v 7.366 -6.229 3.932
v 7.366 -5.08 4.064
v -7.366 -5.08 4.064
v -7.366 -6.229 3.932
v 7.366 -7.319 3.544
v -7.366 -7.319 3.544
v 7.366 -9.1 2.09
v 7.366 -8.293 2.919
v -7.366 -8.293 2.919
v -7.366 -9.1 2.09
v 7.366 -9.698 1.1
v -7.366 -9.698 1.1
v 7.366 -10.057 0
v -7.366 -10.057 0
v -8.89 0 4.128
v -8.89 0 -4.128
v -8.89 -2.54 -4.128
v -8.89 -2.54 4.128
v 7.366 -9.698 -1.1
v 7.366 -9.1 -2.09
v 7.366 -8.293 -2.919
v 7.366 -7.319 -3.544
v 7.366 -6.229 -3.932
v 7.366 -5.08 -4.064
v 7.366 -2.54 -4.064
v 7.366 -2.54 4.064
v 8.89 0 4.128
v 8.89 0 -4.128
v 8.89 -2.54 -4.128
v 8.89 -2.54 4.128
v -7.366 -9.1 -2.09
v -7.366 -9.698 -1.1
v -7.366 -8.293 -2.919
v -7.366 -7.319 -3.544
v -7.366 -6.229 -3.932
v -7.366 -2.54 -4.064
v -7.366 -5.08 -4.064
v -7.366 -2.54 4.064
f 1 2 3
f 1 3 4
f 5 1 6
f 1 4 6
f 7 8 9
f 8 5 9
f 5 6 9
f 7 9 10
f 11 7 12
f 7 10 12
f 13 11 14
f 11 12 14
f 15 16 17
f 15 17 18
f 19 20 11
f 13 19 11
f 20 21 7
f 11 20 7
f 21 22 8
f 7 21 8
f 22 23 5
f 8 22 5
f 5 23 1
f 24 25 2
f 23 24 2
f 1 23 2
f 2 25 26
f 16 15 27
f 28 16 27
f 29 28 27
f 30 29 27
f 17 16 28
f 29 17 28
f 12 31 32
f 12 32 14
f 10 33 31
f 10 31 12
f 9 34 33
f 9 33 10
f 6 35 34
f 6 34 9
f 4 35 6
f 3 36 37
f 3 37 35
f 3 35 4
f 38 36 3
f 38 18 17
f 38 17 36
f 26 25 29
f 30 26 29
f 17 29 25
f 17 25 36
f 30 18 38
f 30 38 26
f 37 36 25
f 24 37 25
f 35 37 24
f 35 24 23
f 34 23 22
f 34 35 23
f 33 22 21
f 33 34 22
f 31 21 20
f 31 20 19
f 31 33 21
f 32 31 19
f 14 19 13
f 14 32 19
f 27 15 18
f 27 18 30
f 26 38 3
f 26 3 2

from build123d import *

# Parameters (mm, degrees)
F0_W        = 17.78
F0_H        = 8.255
F1_DEPTH    = 2.54
F2_W        = 14.732
F2_H        = 8.128
F3_DEPTH    = 10.16
F4_T1_DEPTH = 40.132


# Not quite as in the source:
# - a fillet or chamfer that OpenCascade refuses, or shapes differently, is made with other operations: its cross-section is extruded or revolved along the edge and cut away or added


with BuildPart() as f1:
    # F0 (on Front) → F1 (new body)
    with BuildSketch(Plane.XZ):
        Rectangle(F0_W, F0_H)
    extrude(amount=F1_DEPTH)

    # F2 (on Front) → F3 (join)
    with BuildSketch(Plane.XZ):
        Rectangle(F2_W, F2_H)
    extrude(amount=F3_DEPTH)

    # F4: fillet of radius 5.08 on 2 edges, made by hand

    # F4_s2 → F4_t1 (cut)
    with BuildSketch(Plane.YZ.offset(-20.066)):
        with BuildLine():
            ThreePointArc((-5.08, 4.064), (-8.6721024484, 2.5761024484), (-10.16, -1.016))
            Line((-10.16, -1.016), (-10.16, 4.064))
            Line((-10.16, 4.064), (-5.08, 4.064))
        make_face()
        with BuildLine():
            ThreePointArc((-5.08, -4.064), (-8.6721024484, -2.5761024484), (-10.16, 1.016))
            Line((-10.16, 1.016), (-10.16, -4.064))
            Line((-10.16, -4.064), (-5.08, -4.064))
        make_face()
    extrude(amount=F4_T1_DEPTH, mode=Mode.SUBTRACT)


solid = f1.part
